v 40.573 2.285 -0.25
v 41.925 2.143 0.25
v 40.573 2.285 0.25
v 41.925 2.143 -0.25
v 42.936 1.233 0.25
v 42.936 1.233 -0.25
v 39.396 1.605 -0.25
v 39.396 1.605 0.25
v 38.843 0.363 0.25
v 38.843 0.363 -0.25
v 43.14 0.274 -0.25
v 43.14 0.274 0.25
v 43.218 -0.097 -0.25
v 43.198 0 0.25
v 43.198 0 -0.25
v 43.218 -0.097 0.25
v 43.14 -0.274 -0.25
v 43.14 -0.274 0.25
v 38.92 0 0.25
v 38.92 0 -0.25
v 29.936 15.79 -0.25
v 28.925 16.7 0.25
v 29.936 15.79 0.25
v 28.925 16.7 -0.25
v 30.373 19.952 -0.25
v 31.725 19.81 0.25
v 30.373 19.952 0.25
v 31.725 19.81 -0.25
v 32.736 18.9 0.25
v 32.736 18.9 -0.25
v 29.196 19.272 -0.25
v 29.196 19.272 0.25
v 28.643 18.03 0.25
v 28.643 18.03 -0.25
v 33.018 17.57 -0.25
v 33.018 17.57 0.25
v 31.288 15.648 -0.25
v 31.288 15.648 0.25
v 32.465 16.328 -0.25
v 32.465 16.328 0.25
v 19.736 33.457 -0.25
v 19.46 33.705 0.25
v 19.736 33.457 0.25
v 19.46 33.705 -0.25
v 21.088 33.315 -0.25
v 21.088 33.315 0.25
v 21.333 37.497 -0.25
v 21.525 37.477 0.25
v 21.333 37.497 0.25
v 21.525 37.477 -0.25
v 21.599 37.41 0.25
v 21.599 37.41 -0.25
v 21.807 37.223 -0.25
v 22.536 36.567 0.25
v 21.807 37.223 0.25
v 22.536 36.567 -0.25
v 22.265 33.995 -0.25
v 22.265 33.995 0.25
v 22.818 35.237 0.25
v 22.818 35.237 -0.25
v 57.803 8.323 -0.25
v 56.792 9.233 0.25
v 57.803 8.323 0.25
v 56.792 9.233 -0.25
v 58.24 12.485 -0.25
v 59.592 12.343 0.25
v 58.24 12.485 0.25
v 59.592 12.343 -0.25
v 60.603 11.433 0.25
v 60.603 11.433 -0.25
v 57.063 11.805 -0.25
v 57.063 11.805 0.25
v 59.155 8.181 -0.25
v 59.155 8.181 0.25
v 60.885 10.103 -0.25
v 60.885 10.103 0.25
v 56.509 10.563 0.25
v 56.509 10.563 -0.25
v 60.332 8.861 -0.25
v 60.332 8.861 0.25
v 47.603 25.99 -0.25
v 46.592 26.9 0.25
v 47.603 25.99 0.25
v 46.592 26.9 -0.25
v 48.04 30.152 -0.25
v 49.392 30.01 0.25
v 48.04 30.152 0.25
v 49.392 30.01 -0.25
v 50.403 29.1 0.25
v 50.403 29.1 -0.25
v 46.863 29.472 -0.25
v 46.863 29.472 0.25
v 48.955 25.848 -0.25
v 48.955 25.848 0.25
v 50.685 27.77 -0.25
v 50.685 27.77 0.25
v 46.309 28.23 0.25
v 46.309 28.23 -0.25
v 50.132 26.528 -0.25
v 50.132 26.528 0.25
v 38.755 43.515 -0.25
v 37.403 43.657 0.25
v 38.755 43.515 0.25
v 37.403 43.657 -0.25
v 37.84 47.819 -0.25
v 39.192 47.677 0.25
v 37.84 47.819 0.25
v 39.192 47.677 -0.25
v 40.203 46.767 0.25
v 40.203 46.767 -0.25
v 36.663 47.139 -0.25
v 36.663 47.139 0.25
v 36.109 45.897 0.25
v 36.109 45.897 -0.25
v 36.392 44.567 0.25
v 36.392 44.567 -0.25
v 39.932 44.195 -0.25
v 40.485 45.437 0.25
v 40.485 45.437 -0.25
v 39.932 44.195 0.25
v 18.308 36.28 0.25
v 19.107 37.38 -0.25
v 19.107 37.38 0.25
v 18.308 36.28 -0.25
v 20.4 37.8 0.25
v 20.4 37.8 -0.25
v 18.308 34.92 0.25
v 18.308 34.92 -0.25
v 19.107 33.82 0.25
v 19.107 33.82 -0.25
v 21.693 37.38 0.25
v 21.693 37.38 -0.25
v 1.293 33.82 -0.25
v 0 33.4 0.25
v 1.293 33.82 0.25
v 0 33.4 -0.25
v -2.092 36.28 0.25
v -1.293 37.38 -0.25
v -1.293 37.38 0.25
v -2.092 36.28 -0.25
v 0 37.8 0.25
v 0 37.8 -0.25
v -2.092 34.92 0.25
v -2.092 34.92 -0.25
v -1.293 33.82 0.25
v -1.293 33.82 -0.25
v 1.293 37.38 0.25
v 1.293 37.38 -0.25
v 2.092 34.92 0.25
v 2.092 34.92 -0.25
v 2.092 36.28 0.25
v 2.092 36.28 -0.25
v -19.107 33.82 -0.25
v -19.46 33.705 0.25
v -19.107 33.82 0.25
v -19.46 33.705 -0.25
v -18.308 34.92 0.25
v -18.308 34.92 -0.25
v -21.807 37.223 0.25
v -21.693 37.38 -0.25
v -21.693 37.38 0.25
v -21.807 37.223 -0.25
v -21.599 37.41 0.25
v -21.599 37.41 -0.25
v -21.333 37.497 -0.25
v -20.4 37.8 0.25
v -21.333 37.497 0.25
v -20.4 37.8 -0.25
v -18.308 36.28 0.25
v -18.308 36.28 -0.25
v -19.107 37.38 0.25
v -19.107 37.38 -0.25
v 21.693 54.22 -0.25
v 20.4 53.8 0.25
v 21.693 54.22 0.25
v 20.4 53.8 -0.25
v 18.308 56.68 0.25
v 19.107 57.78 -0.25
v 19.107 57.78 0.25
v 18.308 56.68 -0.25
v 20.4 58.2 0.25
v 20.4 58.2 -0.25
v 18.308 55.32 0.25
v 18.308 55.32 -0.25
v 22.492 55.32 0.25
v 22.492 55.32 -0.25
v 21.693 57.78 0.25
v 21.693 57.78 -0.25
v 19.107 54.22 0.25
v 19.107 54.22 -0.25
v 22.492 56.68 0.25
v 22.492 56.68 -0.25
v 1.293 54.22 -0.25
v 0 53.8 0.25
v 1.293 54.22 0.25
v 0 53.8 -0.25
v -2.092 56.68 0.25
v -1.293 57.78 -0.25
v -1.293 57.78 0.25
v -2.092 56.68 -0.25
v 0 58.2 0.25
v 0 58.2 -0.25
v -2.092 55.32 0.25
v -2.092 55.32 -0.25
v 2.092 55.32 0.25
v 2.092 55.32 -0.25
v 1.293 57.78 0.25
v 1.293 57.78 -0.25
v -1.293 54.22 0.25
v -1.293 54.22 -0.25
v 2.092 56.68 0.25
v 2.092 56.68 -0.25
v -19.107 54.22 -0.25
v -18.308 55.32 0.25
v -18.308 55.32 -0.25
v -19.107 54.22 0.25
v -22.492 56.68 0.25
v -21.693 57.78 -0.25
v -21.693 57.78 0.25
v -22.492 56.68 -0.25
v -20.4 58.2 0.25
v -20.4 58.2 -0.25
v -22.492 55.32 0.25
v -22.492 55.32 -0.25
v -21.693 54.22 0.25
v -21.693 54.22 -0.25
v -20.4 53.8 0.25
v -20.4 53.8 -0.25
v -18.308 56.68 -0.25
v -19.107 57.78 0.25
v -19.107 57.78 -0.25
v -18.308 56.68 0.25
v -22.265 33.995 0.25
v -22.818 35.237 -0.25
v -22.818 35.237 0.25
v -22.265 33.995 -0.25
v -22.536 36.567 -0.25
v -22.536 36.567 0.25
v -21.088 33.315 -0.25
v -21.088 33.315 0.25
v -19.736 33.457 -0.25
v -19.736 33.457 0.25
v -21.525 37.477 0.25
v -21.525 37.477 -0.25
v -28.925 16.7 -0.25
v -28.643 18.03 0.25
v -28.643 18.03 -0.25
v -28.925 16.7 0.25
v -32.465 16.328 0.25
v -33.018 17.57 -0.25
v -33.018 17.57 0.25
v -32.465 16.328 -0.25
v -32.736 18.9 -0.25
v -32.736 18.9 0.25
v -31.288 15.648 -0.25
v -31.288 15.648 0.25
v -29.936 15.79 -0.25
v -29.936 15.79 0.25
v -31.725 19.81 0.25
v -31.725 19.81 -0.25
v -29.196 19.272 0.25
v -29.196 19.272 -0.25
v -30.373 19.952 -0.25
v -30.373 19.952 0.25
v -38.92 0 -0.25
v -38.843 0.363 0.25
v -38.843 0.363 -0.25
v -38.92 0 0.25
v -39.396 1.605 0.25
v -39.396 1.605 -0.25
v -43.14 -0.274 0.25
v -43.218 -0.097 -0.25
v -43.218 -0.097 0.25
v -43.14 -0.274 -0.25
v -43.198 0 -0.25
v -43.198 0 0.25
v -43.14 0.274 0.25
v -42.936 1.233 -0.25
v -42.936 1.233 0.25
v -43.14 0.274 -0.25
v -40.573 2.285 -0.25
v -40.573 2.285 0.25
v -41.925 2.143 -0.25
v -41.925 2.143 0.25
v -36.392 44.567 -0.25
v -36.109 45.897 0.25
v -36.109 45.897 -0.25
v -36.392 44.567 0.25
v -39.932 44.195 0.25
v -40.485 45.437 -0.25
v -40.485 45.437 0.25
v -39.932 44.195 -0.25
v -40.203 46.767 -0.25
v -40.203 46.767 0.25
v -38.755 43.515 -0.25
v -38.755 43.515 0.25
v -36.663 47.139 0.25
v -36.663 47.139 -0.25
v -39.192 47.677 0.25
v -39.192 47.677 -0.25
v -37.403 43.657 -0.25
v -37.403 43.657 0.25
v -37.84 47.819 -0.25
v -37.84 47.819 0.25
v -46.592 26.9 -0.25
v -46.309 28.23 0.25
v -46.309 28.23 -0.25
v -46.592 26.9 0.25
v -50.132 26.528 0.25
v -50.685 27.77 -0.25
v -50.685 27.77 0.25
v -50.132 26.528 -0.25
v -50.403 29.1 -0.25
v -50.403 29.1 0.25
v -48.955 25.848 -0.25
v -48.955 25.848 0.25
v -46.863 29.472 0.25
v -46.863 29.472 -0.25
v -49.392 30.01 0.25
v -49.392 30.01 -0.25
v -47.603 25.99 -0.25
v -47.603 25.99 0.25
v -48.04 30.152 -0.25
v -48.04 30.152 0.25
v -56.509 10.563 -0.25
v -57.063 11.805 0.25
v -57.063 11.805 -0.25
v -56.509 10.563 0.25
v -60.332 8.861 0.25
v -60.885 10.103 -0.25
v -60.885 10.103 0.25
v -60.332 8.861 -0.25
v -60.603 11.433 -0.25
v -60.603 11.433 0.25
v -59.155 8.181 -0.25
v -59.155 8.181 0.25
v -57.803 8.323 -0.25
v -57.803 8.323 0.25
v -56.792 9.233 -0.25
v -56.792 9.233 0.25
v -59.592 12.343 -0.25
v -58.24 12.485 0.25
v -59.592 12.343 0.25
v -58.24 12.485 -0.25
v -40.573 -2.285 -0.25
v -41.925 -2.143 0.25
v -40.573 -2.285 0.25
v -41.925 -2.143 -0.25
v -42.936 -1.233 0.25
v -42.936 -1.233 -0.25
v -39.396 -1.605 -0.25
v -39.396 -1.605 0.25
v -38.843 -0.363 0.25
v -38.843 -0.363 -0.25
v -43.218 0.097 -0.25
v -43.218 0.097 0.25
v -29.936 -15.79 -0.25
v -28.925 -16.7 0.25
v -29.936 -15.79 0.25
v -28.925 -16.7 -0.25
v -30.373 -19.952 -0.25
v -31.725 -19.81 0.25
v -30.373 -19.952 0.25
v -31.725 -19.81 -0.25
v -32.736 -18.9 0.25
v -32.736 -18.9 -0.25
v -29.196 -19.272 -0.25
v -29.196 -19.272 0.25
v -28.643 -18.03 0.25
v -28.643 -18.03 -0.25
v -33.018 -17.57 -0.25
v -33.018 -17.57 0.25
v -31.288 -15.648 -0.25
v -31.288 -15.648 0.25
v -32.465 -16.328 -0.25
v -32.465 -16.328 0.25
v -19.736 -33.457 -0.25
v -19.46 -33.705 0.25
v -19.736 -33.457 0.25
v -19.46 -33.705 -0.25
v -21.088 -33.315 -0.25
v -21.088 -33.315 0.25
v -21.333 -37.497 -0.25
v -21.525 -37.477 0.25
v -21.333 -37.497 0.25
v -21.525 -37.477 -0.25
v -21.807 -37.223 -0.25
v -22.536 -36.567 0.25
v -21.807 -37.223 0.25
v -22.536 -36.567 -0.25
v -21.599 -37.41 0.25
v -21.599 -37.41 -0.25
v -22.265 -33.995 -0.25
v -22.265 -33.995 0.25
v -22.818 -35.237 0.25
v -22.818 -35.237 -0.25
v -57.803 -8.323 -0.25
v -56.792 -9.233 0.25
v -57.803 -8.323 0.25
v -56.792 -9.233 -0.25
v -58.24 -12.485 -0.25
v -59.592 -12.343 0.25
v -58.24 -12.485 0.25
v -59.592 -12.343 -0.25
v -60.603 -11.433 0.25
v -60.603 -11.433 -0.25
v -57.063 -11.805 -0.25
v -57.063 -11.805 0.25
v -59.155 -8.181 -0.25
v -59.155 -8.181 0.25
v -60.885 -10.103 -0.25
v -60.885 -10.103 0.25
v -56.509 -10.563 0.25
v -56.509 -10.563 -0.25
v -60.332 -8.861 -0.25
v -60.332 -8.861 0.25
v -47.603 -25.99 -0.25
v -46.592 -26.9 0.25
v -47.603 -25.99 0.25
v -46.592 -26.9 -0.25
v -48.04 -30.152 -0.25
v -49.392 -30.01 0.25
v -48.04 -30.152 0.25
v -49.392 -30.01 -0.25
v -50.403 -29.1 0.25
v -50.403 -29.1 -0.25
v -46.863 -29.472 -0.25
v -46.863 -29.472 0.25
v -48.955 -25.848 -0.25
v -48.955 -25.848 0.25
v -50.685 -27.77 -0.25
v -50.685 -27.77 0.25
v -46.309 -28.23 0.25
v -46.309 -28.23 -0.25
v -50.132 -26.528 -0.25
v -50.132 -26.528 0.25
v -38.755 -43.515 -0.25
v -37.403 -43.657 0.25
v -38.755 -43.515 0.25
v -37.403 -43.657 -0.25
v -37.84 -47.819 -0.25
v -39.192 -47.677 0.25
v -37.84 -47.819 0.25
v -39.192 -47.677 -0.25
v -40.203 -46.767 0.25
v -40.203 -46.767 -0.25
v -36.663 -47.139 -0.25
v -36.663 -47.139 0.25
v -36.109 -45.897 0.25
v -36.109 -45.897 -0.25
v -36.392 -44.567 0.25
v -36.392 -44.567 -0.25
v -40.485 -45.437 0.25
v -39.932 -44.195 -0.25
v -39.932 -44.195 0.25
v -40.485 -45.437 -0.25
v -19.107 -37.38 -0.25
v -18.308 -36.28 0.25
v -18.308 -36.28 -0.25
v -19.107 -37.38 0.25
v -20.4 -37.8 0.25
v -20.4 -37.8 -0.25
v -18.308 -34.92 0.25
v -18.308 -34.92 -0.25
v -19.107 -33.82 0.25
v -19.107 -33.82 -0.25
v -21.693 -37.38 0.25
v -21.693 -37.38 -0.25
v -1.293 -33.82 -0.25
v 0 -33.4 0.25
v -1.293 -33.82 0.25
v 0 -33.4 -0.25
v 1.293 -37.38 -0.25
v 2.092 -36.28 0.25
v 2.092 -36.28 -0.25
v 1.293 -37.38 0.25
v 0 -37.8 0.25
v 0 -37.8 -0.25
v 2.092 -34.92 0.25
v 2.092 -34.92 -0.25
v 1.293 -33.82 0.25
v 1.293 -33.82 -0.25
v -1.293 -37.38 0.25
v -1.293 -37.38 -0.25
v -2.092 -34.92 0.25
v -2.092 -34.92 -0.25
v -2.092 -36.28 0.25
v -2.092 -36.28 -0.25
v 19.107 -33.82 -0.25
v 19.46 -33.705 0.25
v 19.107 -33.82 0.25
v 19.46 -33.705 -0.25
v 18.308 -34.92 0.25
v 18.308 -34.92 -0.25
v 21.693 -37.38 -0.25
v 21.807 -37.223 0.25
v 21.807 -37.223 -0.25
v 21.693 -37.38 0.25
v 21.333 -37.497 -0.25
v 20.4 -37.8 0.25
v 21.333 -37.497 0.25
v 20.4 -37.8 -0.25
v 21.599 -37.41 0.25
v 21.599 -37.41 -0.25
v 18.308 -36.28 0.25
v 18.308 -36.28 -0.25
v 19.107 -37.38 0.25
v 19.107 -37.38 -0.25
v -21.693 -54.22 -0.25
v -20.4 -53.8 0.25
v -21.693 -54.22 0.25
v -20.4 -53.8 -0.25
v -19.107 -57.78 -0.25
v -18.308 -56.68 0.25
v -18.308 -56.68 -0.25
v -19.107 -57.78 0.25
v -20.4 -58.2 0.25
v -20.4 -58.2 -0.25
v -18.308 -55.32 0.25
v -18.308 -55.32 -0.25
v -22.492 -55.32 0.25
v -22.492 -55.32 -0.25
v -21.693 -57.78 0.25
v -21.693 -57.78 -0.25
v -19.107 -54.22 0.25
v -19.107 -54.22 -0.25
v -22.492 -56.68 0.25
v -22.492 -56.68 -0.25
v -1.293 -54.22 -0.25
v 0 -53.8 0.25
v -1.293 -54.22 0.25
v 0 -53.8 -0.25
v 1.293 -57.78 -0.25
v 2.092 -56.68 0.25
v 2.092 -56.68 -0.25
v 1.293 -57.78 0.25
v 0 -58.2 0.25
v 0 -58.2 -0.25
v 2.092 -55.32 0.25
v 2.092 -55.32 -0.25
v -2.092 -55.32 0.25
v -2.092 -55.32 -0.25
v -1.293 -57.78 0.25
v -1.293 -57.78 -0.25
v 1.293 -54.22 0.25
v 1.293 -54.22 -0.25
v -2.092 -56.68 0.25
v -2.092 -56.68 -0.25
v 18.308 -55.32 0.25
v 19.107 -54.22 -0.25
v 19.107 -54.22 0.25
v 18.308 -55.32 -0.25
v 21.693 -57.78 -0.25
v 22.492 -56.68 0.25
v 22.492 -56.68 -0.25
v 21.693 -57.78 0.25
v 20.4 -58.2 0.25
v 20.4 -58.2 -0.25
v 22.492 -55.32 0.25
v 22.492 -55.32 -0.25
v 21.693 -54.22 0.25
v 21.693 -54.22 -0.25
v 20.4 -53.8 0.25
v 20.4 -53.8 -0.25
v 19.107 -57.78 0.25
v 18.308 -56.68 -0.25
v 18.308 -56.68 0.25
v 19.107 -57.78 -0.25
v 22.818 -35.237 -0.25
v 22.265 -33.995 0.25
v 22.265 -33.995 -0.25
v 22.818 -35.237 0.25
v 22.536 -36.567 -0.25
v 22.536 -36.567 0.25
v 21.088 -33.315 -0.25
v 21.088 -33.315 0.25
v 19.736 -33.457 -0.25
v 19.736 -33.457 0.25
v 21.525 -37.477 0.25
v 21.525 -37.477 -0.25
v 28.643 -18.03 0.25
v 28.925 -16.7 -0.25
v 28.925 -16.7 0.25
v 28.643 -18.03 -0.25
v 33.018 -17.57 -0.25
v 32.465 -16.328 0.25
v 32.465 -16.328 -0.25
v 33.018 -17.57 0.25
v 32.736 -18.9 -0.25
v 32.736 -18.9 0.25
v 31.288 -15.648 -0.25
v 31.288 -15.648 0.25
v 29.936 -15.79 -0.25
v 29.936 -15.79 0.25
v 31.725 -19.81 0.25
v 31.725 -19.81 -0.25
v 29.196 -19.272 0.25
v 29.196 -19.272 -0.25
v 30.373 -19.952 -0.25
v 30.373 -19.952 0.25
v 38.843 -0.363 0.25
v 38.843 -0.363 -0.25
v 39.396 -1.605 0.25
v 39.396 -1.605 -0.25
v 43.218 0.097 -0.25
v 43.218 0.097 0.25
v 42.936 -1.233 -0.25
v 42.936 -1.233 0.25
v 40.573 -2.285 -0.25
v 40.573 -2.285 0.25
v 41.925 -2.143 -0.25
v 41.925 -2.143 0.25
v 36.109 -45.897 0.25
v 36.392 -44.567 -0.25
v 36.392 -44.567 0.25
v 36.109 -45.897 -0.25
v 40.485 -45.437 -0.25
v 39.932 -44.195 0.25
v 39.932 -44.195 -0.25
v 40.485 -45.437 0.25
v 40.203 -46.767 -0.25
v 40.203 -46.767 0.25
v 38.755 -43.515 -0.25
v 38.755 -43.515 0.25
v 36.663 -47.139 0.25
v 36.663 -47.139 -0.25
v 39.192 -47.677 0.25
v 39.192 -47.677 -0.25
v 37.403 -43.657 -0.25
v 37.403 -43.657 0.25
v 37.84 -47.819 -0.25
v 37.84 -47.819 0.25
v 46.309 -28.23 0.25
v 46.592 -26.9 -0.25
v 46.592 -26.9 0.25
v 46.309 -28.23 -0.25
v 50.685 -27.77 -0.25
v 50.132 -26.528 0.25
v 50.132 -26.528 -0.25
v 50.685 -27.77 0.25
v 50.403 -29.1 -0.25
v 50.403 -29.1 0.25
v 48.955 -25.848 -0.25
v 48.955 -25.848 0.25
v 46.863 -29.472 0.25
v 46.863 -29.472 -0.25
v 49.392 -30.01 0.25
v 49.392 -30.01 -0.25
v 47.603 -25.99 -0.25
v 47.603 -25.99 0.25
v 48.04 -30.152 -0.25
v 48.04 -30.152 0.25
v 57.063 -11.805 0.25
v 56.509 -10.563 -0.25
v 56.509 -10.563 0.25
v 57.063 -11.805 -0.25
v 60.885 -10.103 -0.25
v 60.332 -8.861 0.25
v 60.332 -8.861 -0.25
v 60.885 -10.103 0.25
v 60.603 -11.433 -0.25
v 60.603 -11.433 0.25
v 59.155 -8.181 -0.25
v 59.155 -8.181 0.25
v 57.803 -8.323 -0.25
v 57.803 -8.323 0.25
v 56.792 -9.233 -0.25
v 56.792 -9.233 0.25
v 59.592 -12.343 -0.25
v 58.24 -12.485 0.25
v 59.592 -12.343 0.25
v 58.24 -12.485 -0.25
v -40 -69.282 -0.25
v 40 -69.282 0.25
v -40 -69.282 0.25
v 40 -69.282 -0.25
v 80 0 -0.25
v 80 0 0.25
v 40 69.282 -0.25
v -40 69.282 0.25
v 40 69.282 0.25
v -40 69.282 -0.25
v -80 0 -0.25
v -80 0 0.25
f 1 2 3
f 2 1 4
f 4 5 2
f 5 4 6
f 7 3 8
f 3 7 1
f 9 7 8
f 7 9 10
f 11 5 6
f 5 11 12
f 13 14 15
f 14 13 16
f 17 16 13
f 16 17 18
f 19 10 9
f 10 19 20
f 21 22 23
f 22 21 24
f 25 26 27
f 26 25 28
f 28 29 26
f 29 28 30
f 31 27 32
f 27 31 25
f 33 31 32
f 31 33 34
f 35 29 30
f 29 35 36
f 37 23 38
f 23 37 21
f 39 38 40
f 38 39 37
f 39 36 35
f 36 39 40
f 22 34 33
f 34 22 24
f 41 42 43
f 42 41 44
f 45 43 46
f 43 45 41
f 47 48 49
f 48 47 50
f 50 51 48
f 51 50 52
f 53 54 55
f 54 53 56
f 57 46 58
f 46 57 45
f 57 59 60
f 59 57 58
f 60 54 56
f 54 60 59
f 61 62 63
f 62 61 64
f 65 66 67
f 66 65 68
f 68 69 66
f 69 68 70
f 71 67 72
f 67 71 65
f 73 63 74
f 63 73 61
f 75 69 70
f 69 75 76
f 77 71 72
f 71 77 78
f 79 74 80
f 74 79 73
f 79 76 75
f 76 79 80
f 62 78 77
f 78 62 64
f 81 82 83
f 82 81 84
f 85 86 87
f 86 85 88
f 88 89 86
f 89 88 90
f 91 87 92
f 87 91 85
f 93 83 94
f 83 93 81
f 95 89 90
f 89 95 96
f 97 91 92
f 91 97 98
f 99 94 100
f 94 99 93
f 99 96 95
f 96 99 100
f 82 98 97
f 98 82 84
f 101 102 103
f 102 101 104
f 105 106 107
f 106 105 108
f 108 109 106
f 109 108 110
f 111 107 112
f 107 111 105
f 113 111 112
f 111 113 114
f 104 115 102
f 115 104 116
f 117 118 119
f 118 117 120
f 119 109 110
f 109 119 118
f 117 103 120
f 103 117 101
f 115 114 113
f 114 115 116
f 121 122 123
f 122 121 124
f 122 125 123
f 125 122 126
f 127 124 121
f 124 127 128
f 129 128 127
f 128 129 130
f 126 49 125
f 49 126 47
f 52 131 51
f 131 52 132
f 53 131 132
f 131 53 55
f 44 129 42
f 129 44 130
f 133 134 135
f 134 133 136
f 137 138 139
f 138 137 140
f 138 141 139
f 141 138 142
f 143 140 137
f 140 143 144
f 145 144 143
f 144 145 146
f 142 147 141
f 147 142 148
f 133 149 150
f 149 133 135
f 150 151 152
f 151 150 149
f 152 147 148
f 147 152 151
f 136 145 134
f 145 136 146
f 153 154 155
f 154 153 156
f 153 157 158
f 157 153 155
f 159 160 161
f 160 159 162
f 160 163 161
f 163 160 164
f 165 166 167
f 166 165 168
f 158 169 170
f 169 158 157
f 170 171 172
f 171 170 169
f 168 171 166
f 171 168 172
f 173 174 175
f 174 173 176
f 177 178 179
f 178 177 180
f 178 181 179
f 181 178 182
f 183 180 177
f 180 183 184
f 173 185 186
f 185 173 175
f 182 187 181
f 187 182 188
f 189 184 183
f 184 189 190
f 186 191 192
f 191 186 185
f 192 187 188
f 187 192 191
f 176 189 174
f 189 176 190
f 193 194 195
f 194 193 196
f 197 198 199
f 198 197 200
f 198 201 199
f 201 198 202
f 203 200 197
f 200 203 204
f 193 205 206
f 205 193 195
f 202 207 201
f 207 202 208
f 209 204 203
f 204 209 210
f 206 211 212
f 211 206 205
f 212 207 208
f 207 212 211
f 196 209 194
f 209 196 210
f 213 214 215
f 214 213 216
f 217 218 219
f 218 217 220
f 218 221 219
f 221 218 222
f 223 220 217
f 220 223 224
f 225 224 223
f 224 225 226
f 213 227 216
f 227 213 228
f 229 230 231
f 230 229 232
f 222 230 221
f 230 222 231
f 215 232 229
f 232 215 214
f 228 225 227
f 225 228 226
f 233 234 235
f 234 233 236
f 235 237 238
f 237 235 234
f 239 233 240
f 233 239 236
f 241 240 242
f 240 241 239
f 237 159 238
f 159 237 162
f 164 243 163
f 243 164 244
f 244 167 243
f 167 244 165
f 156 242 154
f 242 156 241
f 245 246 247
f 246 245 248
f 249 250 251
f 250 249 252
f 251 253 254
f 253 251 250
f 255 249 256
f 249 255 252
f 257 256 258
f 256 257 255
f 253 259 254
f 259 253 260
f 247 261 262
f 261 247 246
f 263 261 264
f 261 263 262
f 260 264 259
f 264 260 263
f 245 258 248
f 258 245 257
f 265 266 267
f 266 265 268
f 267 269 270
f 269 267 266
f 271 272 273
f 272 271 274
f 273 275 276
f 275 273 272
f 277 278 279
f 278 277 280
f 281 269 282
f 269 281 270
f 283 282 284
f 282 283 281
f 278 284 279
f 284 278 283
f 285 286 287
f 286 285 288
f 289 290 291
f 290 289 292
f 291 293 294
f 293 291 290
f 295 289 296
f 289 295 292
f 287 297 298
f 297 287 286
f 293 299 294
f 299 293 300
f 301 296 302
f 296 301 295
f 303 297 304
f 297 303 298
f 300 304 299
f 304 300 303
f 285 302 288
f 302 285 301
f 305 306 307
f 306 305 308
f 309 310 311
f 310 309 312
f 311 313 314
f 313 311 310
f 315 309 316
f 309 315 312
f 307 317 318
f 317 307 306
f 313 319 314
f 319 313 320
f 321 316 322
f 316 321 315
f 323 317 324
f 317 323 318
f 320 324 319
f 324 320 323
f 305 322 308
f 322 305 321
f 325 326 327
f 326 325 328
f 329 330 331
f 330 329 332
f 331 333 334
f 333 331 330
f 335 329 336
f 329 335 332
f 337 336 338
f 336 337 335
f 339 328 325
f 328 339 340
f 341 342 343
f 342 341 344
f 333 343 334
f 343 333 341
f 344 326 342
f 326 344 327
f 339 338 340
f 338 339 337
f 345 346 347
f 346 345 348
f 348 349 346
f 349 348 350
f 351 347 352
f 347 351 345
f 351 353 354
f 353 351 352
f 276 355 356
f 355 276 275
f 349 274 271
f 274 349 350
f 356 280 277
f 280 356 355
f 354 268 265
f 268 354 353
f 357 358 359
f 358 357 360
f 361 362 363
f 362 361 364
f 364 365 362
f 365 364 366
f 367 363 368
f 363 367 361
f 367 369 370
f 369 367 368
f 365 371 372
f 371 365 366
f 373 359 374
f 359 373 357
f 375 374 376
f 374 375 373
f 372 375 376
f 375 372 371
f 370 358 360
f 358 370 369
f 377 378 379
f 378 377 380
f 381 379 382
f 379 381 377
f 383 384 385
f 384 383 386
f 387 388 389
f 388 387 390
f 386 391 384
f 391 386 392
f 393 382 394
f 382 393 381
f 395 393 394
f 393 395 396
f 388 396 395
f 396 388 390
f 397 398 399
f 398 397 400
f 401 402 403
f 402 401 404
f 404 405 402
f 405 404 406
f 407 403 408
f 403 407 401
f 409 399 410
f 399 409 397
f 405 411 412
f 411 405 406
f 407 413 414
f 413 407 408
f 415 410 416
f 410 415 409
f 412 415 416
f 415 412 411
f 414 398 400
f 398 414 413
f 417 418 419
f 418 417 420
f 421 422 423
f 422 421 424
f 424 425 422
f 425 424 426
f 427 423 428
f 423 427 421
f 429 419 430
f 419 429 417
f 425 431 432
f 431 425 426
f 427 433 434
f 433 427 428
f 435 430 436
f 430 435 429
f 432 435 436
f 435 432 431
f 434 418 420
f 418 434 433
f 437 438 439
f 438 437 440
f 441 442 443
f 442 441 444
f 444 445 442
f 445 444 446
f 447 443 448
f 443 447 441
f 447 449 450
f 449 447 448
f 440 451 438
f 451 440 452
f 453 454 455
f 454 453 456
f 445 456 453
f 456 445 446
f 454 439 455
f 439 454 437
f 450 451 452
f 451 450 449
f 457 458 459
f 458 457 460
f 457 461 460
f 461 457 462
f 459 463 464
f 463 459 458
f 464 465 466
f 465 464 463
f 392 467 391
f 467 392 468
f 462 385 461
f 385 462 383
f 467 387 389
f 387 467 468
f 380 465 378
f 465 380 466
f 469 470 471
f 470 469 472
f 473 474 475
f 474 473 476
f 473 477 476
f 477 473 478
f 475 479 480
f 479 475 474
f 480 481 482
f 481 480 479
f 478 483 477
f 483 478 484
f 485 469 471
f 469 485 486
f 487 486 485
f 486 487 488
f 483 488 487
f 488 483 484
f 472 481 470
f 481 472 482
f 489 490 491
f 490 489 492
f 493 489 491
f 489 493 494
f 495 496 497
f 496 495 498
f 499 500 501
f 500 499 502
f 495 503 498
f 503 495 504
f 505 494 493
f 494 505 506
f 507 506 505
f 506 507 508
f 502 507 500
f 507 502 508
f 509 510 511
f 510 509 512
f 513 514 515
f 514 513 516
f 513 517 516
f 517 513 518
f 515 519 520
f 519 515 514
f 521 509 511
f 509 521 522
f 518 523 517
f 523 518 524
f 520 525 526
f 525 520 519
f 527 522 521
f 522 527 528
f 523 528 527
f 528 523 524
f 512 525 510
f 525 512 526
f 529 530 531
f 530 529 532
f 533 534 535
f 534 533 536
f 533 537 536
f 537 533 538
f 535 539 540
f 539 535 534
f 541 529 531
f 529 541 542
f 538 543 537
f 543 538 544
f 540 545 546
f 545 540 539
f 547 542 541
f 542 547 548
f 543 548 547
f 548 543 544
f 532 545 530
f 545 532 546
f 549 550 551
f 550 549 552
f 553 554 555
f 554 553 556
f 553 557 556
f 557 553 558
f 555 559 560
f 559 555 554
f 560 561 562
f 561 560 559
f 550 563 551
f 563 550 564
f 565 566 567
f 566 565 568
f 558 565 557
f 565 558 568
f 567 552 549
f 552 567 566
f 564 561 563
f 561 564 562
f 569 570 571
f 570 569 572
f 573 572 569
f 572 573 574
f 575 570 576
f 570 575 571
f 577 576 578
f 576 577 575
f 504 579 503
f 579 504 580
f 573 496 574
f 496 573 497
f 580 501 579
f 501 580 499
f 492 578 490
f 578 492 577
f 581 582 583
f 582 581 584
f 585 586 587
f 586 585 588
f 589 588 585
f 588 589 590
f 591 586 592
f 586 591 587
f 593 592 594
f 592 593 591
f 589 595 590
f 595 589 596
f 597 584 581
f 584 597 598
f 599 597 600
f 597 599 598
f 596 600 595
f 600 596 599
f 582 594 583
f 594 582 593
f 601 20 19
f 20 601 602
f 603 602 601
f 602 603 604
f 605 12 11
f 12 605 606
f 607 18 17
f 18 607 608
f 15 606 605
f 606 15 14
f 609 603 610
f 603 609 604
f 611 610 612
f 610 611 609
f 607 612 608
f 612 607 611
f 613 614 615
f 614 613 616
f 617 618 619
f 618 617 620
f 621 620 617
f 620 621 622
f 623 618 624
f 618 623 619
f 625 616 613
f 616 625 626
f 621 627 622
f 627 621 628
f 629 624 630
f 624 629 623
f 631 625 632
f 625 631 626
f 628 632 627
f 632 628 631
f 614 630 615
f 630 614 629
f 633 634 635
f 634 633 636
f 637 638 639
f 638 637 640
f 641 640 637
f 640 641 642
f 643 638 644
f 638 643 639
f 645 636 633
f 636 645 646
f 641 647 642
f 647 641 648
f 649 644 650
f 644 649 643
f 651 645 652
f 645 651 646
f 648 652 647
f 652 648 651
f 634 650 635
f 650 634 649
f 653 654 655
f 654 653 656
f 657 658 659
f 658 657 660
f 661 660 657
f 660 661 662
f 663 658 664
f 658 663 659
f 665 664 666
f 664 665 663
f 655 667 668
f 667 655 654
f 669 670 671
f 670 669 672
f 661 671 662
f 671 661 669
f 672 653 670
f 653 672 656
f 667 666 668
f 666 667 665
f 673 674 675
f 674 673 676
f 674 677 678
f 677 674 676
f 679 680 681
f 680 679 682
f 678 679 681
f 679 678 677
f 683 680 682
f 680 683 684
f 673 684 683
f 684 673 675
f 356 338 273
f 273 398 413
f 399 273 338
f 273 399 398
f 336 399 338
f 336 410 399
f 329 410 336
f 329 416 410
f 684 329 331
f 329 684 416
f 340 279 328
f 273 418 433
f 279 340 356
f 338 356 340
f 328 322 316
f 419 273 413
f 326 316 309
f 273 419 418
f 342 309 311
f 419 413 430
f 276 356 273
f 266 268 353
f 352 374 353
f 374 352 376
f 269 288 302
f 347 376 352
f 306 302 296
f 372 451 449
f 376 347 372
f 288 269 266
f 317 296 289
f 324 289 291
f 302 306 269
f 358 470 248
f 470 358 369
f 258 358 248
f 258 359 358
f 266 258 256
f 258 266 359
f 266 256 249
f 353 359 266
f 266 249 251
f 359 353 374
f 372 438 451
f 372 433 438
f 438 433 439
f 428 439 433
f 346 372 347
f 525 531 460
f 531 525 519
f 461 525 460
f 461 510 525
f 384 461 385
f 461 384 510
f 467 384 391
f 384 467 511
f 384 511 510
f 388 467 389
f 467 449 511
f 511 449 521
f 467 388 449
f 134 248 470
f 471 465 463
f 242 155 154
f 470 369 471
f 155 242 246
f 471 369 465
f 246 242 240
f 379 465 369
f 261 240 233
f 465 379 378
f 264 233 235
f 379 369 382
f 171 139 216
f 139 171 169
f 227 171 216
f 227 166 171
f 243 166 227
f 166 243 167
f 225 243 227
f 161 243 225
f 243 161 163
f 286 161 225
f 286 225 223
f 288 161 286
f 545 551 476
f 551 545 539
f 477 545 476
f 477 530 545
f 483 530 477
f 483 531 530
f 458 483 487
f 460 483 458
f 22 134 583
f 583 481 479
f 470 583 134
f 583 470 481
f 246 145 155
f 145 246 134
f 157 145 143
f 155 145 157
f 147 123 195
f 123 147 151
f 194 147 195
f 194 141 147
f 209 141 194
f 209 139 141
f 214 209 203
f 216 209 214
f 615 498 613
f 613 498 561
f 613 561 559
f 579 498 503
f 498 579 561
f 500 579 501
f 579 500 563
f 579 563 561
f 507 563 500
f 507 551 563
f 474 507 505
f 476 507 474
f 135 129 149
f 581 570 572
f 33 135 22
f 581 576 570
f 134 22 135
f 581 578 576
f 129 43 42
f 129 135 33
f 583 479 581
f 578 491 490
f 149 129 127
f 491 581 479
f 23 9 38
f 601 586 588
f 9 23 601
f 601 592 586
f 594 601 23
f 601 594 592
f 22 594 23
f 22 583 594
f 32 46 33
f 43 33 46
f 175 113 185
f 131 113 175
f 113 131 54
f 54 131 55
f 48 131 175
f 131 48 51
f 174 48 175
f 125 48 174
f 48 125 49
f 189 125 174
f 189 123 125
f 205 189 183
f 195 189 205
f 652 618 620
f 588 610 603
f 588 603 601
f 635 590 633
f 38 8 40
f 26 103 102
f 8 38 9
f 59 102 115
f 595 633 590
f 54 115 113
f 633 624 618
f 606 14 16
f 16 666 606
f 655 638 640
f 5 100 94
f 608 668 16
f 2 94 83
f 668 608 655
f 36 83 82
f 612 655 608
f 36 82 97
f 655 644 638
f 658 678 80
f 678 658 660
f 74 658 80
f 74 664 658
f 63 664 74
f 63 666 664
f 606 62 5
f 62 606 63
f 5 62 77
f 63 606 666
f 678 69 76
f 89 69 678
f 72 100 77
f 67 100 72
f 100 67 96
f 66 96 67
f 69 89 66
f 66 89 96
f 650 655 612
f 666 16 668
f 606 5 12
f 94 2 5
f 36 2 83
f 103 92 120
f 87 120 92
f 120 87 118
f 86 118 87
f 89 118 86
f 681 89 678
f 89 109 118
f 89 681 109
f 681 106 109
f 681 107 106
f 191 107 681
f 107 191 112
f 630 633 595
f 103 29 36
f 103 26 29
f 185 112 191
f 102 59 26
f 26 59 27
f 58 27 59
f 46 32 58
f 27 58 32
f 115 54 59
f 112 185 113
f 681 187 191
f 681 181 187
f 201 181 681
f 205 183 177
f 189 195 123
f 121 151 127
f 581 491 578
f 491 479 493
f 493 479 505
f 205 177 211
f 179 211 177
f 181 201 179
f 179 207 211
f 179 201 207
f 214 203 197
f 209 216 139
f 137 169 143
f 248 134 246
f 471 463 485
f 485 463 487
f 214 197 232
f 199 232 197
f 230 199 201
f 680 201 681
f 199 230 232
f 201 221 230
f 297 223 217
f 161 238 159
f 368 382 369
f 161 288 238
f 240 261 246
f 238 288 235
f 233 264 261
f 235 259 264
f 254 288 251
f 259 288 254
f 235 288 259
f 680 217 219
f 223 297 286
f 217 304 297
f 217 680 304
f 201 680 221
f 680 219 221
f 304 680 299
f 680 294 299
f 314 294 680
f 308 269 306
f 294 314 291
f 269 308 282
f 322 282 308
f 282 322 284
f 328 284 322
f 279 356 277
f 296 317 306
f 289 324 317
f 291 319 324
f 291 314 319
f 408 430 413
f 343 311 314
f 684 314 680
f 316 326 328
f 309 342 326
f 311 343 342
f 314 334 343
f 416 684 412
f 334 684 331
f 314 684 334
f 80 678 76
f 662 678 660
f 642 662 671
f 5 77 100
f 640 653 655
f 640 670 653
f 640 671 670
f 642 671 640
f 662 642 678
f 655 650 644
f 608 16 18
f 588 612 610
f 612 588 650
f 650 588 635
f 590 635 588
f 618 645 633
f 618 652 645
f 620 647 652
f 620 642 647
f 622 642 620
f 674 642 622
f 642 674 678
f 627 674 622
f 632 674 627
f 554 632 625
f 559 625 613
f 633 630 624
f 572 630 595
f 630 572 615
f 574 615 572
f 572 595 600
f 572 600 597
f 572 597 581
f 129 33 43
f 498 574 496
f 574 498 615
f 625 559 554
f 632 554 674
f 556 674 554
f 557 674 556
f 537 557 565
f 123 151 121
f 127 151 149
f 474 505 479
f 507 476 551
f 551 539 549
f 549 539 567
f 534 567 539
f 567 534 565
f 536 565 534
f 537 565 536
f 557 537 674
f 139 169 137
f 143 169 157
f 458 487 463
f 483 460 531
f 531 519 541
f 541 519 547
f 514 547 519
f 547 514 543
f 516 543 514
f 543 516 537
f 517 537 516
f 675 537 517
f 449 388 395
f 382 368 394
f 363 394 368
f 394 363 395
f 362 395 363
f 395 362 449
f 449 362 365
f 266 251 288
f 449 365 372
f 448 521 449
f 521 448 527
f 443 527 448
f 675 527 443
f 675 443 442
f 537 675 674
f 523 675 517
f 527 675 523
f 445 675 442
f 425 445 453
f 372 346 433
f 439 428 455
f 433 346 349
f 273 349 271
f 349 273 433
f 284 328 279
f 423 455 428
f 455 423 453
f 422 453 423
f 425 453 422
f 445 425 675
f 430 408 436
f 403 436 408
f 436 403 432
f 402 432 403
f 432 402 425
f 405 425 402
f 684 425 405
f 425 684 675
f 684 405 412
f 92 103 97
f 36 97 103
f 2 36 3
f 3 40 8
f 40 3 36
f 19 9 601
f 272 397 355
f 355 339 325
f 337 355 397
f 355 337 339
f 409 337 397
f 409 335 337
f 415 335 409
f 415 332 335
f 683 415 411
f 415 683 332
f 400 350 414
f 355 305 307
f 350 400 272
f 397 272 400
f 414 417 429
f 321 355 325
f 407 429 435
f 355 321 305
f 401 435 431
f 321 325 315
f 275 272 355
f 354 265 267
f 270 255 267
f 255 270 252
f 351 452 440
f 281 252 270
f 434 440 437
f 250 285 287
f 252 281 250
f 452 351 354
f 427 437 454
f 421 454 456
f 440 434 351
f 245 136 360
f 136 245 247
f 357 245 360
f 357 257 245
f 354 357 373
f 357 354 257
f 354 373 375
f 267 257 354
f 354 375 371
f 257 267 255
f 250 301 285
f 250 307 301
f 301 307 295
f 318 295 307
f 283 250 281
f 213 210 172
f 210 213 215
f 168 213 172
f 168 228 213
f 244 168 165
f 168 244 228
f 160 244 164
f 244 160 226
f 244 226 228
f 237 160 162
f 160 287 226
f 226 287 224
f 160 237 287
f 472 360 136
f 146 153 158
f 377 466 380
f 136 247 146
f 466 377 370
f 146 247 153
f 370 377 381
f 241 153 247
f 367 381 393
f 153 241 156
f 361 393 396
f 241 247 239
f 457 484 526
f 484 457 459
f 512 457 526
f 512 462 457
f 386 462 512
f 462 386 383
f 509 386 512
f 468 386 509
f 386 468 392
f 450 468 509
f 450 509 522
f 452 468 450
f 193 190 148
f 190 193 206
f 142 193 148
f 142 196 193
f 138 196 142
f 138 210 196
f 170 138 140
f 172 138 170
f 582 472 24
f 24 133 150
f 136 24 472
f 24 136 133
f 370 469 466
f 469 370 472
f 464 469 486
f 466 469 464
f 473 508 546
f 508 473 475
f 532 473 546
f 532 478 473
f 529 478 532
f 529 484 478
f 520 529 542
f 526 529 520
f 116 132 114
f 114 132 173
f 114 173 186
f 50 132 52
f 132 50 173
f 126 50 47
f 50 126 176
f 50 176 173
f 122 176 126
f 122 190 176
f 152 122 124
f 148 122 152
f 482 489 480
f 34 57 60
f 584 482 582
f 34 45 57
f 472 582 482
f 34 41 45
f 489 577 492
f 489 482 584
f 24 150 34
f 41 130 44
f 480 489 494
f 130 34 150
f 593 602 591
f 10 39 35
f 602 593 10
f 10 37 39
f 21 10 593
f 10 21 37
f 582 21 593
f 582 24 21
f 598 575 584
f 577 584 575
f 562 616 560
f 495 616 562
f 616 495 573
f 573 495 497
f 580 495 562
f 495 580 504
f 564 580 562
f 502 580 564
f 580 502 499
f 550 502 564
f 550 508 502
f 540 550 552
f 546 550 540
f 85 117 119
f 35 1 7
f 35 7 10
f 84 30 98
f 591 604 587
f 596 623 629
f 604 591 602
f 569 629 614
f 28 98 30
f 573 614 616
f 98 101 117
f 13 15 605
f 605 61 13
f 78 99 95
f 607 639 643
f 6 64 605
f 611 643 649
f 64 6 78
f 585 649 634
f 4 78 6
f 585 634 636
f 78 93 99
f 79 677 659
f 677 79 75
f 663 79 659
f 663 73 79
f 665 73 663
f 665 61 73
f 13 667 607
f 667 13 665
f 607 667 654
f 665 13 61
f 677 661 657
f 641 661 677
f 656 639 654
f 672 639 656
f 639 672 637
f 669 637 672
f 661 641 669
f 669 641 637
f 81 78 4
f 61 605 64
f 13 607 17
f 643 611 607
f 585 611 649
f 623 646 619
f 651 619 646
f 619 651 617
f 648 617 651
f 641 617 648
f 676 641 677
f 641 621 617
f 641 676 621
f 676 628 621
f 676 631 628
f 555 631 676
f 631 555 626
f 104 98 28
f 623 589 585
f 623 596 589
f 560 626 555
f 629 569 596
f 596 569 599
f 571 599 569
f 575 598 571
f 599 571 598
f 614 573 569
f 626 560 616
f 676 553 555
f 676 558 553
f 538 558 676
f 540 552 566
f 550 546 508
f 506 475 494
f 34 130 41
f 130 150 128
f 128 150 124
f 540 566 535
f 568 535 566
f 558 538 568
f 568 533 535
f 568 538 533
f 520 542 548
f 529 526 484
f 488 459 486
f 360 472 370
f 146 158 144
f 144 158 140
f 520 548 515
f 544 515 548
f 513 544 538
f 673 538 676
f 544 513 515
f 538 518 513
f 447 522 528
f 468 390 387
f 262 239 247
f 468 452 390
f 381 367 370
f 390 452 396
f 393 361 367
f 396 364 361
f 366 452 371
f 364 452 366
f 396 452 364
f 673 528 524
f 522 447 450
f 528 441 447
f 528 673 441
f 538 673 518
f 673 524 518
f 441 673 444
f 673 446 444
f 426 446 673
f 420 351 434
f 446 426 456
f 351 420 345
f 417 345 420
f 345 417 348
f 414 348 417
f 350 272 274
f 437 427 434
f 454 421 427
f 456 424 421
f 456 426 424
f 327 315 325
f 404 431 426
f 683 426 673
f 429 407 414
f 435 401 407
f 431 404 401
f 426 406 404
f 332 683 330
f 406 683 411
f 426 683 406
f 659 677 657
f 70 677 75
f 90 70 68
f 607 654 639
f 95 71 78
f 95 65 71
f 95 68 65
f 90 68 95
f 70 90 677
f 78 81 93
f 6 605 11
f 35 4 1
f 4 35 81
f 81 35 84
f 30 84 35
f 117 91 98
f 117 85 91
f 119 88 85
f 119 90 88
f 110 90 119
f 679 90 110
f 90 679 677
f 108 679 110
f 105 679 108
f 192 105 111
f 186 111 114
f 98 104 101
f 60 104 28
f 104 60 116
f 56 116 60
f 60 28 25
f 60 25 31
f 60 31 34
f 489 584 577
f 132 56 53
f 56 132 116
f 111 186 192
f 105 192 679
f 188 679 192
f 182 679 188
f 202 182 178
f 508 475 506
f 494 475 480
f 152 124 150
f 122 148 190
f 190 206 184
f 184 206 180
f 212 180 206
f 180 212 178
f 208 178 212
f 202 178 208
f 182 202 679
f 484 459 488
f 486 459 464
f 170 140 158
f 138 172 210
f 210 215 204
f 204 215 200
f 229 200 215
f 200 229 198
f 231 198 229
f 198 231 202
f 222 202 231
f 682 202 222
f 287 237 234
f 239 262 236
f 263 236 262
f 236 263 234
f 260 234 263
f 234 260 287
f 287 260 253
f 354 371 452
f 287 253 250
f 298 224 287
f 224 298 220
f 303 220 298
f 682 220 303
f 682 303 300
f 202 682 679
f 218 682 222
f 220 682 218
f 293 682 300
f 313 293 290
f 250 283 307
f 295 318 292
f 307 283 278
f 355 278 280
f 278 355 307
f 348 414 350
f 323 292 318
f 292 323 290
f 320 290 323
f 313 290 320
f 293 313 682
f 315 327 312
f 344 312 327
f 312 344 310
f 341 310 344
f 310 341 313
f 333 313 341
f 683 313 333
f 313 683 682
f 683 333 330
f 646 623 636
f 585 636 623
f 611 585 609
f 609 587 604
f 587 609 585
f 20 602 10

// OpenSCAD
module HEXP0248_FOIL(foil_thickness, foil_radius, shaft_radius) 
{

    difference()
    {

        cylinder( h = foil_thickness, r1 = foil_radius, r2 = foil_radius, center = true, $fn = 6 );

        scale_factor = foil_radius/100;
        
        for ( i = [ 0 : 60 : 350 ])
        {
            rotate([0,0,i+30])
            { 
                translate([100*0.7 * scale_factor,0,0])
                { 
                    for ( j = [ -25.5 * scale_factor : 25.5 * scale_factor : 25.5 * scale_factor ])
                    {
                        for ( i = [ -25.5 * scale_factor : 25.5 * scale_factor : 25.5 * scale_factor ])
                        {
                            translate([j,i,0]) { rotate([0,0,0]) { cylinder( h = 50, r1 = shaft_radius, r2 = shaft_radius, center = true, $fn = 10 ); } }
                        }
                    }
                    
                    //cylinder( h = 50, r1 = 2, r2 = 2, center = true, $fn = 25 ); 

                } 
            }
        }
    }
}

HEXP0248_FOIL(foil_thickness = 0.5 , foil_radius = 80, shaft_radius = 2.2);
